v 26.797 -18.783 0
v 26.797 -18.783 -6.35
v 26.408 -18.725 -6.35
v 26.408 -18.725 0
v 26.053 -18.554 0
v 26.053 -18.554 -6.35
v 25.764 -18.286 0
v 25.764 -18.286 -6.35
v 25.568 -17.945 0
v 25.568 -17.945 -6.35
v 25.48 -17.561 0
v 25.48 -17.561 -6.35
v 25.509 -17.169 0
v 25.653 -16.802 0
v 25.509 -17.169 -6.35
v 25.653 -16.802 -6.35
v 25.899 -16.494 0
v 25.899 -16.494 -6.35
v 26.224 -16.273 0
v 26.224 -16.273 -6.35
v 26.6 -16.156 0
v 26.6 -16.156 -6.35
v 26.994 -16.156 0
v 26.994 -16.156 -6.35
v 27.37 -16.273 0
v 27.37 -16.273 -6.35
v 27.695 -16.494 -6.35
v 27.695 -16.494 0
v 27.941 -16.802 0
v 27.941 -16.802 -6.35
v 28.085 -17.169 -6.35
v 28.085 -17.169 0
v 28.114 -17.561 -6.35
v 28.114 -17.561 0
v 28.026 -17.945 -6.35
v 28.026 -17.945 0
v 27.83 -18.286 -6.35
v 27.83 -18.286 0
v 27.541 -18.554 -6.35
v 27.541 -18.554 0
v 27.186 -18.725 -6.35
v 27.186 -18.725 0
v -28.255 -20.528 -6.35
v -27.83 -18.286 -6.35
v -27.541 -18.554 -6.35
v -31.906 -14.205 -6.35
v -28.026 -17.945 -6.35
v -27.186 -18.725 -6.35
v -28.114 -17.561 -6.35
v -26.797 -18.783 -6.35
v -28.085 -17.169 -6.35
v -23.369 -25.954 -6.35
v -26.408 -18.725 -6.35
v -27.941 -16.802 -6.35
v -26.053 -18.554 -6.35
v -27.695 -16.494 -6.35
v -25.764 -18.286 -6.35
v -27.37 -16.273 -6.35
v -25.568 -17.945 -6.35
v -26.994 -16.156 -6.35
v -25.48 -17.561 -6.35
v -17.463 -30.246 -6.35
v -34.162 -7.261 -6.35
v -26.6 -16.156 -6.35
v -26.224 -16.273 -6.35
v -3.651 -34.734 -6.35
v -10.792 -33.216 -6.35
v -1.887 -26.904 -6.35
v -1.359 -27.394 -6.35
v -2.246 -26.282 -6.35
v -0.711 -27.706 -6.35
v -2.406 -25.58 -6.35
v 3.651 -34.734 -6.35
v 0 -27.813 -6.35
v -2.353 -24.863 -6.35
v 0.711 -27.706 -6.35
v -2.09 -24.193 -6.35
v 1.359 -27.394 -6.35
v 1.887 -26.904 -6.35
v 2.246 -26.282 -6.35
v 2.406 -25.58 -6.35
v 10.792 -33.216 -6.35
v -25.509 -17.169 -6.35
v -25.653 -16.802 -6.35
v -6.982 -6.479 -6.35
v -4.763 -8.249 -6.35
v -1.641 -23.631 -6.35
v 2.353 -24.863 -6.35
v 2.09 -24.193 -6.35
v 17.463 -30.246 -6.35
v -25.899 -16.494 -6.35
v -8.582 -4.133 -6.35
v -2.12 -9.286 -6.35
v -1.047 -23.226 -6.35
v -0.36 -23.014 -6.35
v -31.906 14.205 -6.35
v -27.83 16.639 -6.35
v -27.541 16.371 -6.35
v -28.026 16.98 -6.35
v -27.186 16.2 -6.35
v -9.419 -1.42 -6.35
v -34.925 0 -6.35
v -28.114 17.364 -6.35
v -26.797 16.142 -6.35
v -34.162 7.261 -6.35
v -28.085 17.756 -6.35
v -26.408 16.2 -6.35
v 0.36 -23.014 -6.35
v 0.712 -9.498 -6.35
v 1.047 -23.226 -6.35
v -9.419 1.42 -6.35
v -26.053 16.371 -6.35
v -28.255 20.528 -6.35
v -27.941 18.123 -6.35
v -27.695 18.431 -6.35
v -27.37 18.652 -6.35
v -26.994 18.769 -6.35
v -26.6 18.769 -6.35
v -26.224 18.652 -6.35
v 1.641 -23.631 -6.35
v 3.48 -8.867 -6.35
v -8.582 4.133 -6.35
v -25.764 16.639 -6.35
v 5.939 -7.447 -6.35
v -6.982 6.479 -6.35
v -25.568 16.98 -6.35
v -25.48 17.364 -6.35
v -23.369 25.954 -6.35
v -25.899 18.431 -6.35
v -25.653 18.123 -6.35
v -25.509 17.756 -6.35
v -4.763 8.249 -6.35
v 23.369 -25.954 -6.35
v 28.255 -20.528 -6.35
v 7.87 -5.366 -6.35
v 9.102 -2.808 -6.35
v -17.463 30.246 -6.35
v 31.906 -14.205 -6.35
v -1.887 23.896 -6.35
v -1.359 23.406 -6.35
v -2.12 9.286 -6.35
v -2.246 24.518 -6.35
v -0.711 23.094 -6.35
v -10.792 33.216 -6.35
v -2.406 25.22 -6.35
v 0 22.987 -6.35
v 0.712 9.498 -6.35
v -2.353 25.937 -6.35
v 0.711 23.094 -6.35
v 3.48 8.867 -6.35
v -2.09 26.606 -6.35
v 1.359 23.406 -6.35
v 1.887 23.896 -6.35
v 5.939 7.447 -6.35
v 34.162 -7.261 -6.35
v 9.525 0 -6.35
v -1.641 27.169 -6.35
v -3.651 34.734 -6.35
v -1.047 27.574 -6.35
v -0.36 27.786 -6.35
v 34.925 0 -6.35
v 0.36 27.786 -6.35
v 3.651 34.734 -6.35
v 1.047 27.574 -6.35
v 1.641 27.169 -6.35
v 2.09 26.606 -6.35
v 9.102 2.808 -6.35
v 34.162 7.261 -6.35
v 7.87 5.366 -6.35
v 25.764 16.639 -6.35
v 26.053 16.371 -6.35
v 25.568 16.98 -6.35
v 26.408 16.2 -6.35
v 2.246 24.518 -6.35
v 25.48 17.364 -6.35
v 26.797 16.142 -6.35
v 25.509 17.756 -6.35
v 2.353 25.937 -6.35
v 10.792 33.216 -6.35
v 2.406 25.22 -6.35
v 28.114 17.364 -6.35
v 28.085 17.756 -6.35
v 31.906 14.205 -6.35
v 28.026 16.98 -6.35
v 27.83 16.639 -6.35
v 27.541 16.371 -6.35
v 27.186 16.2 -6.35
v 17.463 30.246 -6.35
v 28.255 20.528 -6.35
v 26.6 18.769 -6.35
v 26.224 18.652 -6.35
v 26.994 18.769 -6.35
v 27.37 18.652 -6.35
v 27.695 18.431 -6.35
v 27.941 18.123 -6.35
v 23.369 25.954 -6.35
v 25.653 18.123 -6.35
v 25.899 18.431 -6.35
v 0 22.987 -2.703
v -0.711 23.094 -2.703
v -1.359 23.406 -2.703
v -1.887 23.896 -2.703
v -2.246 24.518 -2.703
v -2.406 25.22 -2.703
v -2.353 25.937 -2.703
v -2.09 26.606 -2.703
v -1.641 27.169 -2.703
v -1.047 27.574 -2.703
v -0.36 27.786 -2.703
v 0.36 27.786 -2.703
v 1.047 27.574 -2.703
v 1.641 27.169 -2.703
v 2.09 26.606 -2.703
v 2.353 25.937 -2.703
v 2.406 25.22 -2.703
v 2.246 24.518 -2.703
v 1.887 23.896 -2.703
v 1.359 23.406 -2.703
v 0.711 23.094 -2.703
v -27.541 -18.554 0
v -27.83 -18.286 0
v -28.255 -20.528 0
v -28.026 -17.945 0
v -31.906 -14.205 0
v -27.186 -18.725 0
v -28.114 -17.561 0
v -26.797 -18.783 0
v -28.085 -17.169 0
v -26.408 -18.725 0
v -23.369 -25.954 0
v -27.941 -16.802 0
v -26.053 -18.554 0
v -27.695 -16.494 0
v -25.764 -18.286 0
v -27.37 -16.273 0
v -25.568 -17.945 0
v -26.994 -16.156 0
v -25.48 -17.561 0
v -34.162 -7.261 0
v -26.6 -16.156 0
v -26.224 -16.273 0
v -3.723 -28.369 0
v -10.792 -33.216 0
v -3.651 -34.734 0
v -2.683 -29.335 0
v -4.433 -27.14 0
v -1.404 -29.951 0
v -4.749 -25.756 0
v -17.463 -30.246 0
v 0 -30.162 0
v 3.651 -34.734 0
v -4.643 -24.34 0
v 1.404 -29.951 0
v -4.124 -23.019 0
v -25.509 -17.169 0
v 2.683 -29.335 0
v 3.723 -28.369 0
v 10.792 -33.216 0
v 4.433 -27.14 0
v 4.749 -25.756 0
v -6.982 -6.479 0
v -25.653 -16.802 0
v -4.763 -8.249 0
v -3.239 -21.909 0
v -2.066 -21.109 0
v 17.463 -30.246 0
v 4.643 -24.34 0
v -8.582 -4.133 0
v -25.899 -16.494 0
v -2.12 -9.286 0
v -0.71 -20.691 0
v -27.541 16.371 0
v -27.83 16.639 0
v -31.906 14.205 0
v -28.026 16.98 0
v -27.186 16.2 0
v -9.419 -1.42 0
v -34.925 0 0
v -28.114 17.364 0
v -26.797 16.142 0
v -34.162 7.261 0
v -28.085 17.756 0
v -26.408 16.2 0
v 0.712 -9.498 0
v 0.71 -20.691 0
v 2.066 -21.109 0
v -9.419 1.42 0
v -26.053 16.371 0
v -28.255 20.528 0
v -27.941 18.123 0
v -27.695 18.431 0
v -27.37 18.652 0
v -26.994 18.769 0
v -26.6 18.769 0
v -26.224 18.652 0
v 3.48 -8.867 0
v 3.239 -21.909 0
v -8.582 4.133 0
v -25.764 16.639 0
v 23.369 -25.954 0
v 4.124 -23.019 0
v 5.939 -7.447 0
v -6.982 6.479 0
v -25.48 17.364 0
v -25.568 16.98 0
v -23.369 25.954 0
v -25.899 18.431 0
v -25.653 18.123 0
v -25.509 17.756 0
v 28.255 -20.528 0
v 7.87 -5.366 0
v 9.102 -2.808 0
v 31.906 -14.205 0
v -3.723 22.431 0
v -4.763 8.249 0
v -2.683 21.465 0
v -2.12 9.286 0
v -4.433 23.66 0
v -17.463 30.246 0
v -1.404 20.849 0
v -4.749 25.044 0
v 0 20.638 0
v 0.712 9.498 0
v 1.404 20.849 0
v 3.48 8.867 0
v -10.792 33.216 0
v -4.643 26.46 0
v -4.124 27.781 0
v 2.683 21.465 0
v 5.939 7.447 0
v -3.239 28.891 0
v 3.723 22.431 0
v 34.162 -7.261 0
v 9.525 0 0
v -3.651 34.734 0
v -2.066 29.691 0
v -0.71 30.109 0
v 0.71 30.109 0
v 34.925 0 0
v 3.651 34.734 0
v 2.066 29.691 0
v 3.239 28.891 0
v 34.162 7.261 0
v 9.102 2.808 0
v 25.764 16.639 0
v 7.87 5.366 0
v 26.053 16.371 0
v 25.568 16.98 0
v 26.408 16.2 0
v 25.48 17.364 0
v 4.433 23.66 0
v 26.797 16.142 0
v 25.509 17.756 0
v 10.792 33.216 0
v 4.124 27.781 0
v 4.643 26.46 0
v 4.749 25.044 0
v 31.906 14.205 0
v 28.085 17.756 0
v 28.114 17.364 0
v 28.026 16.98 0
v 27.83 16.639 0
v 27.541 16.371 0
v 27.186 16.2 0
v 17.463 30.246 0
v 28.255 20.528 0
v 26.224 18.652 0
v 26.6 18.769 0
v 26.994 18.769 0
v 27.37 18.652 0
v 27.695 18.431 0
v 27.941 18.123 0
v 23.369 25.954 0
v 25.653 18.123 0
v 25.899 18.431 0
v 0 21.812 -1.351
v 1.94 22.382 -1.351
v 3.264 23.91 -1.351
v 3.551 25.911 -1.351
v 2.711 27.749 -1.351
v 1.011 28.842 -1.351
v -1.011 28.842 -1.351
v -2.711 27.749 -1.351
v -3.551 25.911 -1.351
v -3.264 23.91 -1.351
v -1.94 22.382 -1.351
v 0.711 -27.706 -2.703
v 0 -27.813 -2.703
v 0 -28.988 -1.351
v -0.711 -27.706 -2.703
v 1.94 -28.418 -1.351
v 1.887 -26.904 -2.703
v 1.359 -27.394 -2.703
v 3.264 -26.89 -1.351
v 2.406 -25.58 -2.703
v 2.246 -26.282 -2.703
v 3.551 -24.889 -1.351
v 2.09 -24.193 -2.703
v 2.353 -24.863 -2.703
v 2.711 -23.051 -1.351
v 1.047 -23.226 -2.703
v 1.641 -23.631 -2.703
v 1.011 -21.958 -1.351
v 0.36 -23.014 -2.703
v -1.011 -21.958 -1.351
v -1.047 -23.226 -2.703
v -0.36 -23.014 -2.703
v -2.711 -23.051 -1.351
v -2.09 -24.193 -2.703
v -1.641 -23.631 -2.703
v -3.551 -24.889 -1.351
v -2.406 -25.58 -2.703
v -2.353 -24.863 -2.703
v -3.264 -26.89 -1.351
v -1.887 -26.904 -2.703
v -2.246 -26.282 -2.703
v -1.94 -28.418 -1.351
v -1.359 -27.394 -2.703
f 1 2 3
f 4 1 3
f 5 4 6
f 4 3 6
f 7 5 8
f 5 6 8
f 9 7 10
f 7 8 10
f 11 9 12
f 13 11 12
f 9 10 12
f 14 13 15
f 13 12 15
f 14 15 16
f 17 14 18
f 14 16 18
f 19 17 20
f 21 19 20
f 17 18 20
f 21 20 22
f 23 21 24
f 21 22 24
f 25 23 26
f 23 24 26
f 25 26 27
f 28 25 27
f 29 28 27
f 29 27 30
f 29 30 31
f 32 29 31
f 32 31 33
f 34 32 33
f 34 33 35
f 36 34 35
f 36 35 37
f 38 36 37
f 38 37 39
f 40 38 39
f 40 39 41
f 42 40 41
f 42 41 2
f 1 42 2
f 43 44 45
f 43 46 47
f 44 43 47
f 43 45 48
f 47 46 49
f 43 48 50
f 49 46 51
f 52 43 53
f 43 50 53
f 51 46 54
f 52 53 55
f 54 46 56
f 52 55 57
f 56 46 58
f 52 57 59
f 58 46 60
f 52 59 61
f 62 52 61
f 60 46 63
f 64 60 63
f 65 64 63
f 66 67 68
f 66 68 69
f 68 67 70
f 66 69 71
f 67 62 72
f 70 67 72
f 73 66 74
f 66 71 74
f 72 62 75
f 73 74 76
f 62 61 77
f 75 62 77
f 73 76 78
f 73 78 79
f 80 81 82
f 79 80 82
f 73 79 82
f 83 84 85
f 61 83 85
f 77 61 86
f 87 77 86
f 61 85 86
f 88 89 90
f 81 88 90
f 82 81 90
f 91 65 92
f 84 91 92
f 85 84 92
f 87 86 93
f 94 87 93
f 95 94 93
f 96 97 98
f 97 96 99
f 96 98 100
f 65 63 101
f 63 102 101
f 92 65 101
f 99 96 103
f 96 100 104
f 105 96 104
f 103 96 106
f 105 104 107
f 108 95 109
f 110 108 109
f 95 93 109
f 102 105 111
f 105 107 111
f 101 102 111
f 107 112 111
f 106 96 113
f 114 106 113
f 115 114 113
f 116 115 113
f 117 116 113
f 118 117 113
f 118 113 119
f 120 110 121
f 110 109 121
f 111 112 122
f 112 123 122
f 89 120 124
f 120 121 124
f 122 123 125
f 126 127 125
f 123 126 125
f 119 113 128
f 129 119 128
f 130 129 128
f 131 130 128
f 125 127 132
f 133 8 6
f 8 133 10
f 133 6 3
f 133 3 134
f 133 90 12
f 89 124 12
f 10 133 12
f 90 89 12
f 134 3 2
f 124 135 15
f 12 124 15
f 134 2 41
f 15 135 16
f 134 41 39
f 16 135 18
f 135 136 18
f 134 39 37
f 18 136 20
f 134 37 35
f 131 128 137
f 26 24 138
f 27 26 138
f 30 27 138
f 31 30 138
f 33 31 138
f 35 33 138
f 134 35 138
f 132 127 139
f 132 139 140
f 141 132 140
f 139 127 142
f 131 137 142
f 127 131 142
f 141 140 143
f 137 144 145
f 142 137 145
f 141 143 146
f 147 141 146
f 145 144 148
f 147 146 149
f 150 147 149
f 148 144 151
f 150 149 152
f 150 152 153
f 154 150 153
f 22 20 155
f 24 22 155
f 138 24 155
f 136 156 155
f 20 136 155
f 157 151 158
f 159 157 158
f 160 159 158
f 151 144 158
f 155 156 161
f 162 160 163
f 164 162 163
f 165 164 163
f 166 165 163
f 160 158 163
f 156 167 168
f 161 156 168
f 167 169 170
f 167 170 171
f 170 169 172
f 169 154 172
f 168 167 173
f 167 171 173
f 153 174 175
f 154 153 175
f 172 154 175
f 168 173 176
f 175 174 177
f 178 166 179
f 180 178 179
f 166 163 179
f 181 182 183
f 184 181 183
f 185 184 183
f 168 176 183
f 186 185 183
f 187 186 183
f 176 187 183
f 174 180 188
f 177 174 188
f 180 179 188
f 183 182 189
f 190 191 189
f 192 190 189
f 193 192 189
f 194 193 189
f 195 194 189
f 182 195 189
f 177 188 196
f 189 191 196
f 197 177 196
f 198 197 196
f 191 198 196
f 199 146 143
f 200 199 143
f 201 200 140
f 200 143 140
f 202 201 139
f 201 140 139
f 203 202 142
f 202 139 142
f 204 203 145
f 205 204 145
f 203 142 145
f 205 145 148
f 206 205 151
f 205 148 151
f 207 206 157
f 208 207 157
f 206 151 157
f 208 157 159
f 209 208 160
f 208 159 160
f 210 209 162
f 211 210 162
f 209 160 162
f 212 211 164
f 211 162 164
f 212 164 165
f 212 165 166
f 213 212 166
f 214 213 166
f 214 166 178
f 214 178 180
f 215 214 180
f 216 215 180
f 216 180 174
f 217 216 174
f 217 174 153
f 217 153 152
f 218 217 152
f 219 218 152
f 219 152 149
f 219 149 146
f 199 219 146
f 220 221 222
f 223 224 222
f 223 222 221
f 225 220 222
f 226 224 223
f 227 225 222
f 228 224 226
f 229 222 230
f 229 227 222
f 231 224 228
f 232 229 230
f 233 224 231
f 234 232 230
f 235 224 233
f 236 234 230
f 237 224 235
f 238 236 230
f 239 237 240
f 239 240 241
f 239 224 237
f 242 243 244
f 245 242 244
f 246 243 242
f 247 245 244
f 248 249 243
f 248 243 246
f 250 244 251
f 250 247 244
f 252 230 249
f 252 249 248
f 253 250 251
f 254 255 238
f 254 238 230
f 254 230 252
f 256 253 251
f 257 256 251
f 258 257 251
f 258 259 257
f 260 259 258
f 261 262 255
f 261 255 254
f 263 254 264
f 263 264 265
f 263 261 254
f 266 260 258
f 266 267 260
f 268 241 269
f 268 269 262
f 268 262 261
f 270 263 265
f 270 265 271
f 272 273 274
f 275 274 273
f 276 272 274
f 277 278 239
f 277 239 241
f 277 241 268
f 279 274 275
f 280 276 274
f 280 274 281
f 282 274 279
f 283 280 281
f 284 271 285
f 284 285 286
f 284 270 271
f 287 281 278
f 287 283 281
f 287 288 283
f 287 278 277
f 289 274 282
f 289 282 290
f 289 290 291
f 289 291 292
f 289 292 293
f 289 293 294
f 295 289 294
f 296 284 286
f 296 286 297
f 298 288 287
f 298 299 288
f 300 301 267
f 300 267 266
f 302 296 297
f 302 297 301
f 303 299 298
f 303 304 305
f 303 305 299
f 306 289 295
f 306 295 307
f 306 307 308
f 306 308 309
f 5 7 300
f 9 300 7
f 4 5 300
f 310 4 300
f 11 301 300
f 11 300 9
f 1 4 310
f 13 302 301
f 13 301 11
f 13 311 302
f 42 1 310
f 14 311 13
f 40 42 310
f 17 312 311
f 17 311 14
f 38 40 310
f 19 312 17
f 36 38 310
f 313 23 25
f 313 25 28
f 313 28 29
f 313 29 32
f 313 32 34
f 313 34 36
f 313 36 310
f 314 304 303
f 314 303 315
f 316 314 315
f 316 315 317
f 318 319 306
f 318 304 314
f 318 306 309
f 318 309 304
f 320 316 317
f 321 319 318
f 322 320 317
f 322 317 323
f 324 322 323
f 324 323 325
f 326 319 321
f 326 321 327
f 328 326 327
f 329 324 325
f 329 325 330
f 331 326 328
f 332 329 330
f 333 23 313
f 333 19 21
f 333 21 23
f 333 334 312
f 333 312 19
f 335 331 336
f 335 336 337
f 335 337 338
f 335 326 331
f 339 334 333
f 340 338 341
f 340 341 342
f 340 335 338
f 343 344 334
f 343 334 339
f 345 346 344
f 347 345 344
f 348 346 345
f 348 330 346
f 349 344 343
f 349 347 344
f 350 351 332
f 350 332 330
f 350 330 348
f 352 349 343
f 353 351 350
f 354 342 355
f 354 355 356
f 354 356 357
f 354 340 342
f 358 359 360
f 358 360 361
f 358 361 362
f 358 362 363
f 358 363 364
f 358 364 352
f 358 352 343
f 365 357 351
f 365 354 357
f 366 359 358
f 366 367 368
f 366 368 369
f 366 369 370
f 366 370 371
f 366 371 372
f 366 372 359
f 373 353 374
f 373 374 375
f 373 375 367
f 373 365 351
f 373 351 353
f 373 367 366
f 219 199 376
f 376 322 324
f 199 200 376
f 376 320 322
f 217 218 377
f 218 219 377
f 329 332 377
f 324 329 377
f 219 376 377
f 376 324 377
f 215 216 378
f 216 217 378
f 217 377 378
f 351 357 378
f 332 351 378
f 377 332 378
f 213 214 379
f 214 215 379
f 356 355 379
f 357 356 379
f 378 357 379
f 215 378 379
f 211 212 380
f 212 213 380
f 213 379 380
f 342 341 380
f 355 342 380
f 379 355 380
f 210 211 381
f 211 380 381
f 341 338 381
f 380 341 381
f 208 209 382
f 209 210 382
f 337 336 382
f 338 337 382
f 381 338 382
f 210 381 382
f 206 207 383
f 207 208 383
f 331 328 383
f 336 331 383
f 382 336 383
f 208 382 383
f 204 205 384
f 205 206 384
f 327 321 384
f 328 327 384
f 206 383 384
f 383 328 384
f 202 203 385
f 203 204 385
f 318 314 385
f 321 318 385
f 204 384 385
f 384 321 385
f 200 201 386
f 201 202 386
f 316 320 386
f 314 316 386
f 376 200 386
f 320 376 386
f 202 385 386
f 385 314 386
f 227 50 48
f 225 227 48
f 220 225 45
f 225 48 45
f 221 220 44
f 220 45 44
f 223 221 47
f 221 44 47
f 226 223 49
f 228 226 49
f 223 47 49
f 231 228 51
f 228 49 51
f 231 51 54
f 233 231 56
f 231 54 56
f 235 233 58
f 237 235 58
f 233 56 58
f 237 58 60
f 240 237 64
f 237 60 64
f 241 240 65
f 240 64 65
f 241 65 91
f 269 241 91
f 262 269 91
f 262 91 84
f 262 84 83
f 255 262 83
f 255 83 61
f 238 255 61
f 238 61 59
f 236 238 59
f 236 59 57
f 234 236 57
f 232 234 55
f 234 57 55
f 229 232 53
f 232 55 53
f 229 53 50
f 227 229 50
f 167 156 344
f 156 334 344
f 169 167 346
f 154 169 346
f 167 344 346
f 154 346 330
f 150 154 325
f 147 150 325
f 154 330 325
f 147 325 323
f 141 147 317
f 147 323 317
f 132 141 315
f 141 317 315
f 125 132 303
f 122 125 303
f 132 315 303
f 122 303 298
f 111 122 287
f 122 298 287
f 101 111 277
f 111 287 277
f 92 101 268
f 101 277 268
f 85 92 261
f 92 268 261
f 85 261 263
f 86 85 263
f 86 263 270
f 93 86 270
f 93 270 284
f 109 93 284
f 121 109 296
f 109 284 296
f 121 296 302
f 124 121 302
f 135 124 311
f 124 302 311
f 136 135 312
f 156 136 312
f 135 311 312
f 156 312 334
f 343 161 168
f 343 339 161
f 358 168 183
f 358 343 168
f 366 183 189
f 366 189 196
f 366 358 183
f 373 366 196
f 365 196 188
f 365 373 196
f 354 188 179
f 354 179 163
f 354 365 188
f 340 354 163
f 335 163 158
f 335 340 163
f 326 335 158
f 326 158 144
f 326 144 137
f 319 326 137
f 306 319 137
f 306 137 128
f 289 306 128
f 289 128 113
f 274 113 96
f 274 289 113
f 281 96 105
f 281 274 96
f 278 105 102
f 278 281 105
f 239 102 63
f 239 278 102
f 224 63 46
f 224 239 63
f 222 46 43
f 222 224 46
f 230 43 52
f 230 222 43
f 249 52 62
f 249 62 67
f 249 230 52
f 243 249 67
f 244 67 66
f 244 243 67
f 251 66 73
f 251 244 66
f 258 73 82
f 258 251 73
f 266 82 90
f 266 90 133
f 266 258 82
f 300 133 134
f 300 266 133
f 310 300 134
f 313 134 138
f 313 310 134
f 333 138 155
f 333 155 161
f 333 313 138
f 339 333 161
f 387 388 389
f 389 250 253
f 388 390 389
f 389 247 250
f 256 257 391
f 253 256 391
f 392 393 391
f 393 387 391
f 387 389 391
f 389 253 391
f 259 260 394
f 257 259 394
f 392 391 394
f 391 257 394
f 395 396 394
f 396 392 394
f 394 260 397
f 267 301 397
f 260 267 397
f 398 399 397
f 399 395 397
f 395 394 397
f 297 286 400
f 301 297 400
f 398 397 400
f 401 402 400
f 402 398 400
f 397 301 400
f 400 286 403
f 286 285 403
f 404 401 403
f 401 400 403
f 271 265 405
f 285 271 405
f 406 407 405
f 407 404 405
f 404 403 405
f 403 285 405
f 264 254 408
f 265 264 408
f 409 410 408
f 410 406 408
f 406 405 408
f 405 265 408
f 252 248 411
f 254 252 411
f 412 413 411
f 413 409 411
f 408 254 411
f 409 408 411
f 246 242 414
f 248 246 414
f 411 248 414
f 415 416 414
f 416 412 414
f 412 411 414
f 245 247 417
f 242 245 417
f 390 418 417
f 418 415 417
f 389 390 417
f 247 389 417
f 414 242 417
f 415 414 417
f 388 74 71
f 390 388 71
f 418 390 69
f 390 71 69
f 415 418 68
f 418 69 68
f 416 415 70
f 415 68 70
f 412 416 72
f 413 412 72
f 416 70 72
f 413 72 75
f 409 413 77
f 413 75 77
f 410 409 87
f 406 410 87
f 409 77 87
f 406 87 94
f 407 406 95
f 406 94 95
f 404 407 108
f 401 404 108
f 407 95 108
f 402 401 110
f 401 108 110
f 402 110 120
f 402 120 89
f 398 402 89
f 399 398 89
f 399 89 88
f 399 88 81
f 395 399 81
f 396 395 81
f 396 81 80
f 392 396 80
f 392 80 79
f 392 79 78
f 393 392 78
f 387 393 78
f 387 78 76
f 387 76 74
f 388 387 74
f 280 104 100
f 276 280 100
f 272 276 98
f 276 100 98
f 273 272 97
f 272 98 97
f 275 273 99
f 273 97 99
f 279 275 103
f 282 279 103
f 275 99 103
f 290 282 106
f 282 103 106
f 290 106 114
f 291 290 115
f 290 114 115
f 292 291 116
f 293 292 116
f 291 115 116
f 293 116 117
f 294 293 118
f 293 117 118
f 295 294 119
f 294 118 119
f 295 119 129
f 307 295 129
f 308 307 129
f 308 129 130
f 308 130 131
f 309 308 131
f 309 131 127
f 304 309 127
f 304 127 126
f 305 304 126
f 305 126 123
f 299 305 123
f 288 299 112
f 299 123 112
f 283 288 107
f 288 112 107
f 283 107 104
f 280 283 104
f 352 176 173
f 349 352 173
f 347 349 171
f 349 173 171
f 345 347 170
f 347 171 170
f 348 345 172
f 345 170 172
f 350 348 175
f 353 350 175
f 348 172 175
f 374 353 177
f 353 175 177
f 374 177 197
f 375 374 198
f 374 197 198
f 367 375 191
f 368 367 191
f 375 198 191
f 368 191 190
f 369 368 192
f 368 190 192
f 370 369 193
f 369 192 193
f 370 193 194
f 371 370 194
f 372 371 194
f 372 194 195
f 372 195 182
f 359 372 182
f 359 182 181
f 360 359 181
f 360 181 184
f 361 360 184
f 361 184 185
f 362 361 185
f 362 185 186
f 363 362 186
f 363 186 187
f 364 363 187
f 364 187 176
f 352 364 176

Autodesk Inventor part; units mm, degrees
ref_plane "YZ Plane" through (0, 0, 0) normal (1, 0, 0) x (0, 1, 0)
ref_plane "XZ Plane" through (0, 0, 0) normal (0, 1, 0) x (-1, 0, 0)
ref_plane "XY Plane" through (0, 0, 0) normal (0, 0, 1) x (1, 0, 0)
sketch "Sketch1" plane through (0, 0, 0) normal (0, 0, 1) x (1, 0, 0)
  circle A0 centre (0, 0) radius 34.925
  circle A1 centre (0, 0) radius 9.525
  point P0 (0, 25.4)
  point P1 (0, -25.4)
  point P2 (-26.797, -17.4625)
  point P3 (-26.797, 17.4625)
  point P4 (26.797, 17.4625)
  point P5 (26.797, -17.4625)
  dimension "d0" = 69.85
  dimension "d1" = 19.05
  dimension "d2" = 25.4
  dimension "d3" = 25.4
  dimension "d4" = 26.797
  dimension "d5" = 17.4625
  dimension "d6" = 17.4625
  dimension "d7" = 26.797
extrude "Extrusion1" add sketch "Sketch1" against normal blind 6.35
hole "Hole1" at (-26.797, -17.4625, 0) at (-26.797, 17.4625, 0) at (26.797, 17.4625, 0) at (26.797, -17.4625, 0) direction (0, 0, -1) diameter 2.6416 end through all thread size "6-32 UNC" class "2B" standard "ANSI Unified Screw Threads"
hole "Hole2" at (0, 25.4, 0) at (0, -25.4, 0) direction (0, 0, -1) diameter 4.826 end through all countersink diameter 9.525 countersink angle 82
properties part number "Dewalt Drill Drive CIMmotor Adaptor"
